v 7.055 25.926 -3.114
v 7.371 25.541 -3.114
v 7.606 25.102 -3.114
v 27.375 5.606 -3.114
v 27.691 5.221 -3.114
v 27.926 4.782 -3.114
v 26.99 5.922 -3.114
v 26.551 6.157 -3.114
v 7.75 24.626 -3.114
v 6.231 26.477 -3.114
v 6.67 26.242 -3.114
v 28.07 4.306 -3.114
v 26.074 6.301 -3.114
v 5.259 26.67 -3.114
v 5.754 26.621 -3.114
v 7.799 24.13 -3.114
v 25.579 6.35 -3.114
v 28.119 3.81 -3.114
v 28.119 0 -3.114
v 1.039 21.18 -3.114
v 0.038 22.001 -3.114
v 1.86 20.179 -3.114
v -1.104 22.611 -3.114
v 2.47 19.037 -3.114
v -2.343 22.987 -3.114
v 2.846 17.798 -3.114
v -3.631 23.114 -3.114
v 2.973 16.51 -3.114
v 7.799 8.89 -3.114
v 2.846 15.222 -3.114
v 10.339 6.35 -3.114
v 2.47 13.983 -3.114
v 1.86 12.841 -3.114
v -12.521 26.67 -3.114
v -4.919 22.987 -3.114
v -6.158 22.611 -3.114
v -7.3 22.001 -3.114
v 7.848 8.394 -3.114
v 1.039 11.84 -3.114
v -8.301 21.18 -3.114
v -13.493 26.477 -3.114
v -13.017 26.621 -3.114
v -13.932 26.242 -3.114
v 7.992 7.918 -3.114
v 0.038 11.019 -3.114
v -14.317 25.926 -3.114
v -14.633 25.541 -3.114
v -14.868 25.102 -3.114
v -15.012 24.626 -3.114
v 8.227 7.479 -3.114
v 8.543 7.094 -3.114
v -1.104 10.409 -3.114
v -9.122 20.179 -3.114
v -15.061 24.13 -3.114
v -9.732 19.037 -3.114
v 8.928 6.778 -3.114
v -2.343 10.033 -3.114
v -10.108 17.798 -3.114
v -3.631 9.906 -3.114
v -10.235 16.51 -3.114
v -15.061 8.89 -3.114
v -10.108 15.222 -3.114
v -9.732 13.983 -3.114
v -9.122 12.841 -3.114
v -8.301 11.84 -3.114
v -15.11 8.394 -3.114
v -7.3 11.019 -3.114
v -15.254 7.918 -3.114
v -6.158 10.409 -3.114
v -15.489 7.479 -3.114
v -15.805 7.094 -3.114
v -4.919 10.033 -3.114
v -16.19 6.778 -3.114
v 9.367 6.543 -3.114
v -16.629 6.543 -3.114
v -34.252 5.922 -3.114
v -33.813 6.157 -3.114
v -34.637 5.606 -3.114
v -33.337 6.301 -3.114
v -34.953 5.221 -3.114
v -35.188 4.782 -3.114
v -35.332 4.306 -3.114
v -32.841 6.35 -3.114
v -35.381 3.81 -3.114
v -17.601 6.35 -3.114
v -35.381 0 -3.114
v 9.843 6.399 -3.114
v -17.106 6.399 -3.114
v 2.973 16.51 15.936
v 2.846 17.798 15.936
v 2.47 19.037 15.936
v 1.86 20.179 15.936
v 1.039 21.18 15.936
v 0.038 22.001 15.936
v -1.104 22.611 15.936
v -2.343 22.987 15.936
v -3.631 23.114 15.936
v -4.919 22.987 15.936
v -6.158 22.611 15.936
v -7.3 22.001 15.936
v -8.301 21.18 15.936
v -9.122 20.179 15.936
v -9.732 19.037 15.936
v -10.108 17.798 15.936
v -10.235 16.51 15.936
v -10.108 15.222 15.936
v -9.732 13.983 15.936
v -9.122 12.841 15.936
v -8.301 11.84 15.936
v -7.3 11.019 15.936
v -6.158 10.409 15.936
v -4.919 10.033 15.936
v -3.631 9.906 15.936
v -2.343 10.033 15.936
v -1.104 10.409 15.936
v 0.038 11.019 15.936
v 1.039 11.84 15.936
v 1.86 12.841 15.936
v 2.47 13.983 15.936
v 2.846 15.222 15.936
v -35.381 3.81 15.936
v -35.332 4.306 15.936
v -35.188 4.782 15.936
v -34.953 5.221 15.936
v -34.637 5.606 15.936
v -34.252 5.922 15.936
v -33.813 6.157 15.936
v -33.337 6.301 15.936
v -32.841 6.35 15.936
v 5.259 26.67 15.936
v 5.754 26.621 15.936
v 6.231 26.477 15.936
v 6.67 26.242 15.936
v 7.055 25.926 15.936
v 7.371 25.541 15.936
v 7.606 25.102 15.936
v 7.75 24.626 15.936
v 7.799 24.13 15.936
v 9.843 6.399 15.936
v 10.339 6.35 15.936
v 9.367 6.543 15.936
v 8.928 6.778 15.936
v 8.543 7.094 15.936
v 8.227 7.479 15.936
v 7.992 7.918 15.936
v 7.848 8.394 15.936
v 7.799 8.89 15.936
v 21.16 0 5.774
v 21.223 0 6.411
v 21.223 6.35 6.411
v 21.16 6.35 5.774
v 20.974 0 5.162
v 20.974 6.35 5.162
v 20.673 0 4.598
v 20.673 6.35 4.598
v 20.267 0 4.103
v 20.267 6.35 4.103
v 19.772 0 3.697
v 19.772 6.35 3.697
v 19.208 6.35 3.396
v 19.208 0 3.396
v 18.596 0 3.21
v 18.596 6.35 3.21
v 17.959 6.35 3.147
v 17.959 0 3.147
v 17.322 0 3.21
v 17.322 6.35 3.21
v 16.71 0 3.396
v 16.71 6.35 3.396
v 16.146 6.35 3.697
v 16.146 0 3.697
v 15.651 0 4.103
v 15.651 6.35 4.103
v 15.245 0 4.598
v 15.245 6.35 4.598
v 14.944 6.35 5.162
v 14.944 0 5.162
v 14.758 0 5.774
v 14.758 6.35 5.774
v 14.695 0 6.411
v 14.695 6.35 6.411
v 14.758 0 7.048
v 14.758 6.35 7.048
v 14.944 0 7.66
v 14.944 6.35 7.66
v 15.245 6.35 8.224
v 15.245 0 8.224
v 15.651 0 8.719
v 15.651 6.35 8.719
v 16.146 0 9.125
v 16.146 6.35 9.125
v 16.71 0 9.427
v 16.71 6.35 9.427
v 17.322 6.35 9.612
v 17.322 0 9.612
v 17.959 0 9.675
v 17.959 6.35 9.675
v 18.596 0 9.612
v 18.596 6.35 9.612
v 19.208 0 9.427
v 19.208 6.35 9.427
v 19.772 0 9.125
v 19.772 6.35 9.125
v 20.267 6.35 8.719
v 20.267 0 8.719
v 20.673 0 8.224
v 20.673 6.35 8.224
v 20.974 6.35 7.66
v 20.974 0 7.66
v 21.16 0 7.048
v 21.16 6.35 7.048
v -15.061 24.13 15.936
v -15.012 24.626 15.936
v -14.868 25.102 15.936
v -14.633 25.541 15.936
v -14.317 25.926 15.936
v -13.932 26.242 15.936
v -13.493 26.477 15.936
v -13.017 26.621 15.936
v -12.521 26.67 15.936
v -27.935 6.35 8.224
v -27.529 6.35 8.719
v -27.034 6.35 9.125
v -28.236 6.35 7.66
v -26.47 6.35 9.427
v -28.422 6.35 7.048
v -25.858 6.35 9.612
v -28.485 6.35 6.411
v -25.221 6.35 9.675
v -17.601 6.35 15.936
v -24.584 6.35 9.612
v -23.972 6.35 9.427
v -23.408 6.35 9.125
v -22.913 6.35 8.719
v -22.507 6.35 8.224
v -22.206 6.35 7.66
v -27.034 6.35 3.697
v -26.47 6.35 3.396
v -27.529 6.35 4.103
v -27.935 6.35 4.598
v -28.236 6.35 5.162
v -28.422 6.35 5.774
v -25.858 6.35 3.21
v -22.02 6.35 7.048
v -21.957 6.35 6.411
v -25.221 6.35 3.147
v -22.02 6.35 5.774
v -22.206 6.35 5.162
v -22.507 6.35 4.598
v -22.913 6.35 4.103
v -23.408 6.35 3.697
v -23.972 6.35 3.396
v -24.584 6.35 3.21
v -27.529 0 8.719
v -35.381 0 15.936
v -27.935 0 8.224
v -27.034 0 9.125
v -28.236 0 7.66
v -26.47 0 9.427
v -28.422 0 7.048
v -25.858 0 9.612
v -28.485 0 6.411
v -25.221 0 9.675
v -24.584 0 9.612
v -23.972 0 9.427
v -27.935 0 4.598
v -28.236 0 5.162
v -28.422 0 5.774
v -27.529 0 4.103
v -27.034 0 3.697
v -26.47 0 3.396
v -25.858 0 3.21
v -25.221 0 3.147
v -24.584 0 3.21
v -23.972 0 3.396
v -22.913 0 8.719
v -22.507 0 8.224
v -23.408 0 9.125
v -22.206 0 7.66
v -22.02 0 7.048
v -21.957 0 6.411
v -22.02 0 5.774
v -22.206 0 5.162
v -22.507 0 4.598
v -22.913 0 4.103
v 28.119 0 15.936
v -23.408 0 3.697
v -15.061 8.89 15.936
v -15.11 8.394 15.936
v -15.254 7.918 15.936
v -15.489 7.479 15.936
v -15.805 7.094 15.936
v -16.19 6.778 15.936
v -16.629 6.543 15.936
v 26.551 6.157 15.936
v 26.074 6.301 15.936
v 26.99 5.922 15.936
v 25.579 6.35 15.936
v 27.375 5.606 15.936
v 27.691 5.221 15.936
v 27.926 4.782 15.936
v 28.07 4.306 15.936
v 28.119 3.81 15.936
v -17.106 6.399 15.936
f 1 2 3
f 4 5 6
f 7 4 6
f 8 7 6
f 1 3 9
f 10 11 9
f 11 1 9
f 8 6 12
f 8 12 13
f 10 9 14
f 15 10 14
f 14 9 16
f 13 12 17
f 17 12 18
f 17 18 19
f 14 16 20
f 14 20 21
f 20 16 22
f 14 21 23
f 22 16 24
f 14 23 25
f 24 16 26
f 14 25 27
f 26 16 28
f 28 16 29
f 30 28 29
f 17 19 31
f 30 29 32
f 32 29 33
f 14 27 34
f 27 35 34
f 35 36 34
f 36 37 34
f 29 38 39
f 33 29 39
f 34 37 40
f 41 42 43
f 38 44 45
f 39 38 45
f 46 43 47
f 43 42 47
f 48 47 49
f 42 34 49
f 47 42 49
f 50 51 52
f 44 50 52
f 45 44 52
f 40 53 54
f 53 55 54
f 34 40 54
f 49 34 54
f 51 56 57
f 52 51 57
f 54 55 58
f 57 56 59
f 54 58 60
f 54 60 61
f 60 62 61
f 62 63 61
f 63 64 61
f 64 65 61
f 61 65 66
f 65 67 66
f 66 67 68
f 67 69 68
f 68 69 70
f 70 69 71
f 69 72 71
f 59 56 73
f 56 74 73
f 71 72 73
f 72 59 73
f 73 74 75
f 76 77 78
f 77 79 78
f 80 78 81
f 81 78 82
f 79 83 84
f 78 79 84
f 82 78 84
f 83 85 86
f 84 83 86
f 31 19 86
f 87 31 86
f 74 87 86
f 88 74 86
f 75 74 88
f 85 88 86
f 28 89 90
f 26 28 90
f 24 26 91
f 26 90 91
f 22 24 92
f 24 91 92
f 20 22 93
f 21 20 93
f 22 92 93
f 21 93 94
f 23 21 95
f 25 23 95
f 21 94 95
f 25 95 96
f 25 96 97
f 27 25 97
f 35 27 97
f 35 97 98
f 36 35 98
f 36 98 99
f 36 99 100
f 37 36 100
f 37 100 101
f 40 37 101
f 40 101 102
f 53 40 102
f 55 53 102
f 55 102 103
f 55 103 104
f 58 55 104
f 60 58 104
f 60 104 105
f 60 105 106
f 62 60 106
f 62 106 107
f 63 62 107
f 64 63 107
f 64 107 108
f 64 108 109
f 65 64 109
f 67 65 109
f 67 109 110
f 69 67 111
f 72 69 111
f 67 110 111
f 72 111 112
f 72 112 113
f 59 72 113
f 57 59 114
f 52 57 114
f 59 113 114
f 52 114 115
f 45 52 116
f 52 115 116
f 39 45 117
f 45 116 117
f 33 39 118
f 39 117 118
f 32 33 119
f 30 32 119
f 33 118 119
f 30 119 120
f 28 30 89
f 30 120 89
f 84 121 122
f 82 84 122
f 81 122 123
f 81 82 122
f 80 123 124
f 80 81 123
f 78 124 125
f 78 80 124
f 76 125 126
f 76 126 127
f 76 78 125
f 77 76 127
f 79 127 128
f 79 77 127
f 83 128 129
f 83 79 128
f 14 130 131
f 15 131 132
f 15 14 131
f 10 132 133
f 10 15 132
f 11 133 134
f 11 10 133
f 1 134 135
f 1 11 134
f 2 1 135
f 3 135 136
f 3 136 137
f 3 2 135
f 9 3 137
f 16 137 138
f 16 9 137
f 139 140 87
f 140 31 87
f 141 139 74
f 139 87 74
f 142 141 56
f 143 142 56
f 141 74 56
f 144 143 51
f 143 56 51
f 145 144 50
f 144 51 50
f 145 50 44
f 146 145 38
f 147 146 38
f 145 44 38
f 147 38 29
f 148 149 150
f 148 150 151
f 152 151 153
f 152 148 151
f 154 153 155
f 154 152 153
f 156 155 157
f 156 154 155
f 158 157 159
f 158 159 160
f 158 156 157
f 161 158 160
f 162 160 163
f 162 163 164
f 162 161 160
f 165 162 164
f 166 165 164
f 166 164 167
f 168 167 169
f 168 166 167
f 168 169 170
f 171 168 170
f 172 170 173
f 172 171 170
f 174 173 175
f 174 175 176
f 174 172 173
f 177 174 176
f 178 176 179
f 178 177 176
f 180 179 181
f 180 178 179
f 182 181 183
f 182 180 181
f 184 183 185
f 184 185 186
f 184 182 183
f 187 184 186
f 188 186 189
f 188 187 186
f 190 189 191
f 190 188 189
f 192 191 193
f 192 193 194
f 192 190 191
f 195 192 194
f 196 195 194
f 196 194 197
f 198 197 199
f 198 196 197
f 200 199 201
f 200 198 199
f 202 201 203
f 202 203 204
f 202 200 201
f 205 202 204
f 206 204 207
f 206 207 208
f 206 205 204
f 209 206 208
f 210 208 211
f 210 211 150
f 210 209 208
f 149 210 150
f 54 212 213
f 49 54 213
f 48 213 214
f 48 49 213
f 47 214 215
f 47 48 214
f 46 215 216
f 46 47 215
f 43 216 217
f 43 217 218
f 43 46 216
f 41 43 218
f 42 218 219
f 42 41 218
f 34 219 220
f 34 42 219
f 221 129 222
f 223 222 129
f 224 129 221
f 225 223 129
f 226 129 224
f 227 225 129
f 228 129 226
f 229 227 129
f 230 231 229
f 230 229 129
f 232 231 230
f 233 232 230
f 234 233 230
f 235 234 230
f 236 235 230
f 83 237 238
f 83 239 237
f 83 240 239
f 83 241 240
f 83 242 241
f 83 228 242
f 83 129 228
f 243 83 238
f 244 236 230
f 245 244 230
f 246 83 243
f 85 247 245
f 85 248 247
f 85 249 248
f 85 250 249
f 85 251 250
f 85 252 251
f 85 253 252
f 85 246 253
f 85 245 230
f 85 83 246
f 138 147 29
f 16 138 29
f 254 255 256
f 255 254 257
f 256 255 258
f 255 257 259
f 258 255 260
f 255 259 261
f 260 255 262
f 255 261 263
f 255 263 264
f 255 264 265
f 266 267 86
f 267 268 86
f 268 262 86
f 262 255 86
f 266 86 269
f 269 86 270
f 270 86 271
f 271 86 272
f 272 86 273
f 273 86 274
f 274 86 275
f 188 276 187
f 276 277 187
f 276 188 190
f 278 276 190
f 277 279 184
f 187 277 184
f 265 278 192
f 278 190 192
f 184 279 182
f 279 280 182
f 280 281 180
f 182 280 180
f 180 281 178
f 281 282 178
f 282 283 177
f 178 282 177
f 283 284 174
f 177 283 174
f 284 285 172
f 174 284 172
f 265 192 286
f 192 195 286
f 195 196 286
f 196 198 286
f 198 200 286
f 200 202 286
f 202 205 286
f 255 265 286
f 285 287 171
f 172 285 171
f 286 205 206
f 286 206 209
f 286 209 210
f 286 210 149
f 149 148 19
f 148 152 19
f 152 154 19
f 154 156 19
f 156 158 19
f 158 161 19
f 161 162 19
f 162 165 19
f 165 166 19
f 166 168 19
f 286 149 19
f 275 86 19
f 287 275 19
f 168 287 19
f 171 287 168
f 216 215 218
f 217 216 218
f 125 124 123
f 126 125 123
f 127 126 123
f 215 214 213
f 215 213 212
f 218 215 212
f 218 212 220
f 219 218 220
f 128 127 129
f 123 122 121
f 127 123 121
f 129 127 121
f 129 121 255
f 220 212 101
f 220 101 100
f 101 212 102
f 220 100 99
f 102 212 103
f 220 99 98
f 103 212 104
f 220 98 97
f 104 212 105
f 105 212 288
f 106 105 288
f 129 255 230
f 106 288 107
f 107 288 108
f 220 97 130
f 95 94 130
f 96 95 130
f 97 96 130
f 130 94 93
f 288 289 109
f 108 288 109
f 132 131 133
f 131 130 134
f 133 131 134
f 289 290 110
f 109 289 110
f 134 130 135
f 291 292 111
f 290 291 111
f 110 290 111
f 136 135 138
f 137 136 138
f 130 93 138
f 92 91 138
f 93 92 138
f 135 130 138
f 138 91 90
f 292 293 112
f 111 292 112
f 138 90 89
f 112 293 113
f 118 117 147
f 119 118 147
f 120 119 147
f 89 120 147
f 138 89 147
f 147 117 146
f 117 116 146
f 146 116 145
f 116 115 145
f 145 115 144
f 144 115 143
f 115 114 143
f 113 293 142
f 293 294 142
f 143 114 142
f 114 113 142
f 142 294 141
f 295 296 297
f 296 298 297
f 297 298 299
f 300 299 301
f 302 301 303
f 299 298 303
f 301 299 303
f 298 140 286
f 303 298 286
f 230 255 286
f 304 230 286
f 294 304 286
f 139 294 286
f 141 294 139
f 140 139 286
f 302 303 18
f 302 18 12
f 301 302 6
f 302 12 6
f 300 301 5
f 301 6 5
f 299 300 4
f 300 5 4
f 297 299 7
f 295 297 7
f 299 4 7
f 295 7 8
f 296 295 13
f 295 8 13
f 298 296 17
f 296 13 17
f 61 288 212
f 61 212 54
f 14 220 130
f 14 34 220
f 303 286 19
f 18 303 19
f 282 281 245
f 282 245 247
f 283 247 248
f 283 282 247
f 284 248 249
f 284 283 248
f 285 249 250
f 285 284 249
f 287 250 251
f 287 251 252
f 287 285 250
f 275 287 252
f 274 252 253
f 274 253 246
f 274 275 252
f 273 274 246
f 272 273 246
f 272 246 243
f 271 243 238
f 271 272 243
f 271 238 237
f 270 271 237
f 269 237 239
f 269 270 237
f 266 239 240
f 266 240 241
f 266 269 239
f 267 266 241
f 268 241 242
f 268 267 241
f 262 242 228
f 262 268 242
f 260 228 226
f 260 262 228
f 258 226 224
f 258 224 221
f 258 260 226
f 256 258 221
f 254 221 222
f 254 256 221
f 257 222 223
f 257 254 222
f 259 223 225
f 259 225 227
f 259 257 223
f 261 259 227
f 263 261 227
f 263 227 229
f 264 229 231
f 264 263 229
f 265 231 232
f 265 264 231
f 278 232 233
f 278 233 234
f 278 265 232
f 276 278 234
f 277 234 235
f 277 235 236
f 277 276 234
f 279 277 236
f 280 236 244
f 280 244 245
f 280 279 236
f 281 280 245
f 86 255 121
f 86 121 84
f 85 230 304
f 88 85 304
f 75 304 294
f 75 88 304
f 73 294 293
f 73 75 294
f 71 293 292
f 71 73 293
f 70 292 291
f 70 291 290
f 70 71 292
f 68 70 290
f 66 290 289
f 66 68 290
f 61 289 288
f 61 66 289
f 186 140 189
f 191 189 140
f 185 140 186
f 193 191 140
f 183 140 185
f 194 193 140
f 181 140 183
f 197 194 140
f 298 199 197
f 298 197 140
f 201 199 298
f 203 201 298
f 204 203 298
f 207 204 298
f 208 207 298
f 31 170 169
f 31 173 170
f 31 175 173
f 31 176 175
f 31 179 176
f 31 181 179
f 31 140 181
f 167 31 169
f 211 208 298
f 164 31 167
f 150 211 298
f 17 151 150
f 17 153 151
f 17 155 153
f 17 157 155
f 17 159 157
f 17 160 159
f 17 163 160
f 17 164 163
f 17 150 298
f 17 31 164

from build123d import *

# Parameters (mm, degrees)
SKETCH1_W           = 17.78
SKETCH1_H           = 19.05
SKETCH1_R           = 3.2639
SKETCH1_W_2         = 27.94
BOSS_EXTRUDE3_DEPTH = 6.35
SKETCH3_W           = 22.86
SKETCH3_H           = 19.05
BOSS_EXTRUDE4_DEPTH = 20.32
SKETCH6_R           = 6.604
CUT_EXTRUDE1_DEPTH  = 20.32
FILLET5_R           = 2.54


with BuildPart() as part:
    # Sketch1 → Boss-Extrude3 (new body)
    with BuildSketch(Plane(origin=(0, 0, 0), x_dir=(1, 0, 0), z_dir=(0, 1, 0))):
        with Locations((-26.491045528, -6.411090754)):
            Rectangle(SKETCH1_W, SKETCH1_H)
        with Locations((-25.221045528, -6.411090754)):
            Circle(SKETCH1_R, mode=Mode.SUBTRACT)
        with Locations((-3.631045528, -6.411090754)):
            Rectangle(SKETCH1_W_2, SKETCH1_H)
        with Locations((19.228954472, -6.411090754)):
            Rectangle(SKETCH1_W, SKETCH1_H)
        with Locations((17.958954472, -6.411090754)):
            Circle(SKETCH1_R, mode=Mode.SUBTRACT)
    extrude(amount=BOSS_EXTRUDE3_DEPTH)

    # Sketch3 → Boss-Extrude4 (add)
    with BuildSketch(Plane(origin=(0, 6.35, 0), x_dir=(1, 0, 0), z_dir=(0, 1, 0))):
        with Locations((-3.631045528, -6.411090754)):
            Rectangle(SKETCH3_W, SKETCH3_H)
    extrude(amount=BOSS_EXTRUDE4_DEPTH)

    # Sketch6 → Cut-Extrude1 (cut)
    with BuildSketch(Plane.XY.offset(15.936090754)):
        with Locations((-3.631045528, 16.51)):
            Circle(SKETCH6_R)
    extrude(amount=-CUT_EXTRUDE1_DEPTH, mode=Mode.SUBTRACT)

    # Fillet5
    fillet5_edges = [part.edges().sort_by_distance(p)[0] for p in [
        (-15.061045528, 6.35, 6.411090754),
        (-35.381045528, 6.35, 6.411090754),
        (28.118954472, 6.35, 6.411090754),
        (7.798954472, 26.67, 6.411090754),
        (-15.061045528, 26.67, 6.411090754),
        (7.798954472, 6.35, 6.411090754),
    ]]
    fillet(fillet5_edges, radius=FILLET5_R)


solid = part.part
